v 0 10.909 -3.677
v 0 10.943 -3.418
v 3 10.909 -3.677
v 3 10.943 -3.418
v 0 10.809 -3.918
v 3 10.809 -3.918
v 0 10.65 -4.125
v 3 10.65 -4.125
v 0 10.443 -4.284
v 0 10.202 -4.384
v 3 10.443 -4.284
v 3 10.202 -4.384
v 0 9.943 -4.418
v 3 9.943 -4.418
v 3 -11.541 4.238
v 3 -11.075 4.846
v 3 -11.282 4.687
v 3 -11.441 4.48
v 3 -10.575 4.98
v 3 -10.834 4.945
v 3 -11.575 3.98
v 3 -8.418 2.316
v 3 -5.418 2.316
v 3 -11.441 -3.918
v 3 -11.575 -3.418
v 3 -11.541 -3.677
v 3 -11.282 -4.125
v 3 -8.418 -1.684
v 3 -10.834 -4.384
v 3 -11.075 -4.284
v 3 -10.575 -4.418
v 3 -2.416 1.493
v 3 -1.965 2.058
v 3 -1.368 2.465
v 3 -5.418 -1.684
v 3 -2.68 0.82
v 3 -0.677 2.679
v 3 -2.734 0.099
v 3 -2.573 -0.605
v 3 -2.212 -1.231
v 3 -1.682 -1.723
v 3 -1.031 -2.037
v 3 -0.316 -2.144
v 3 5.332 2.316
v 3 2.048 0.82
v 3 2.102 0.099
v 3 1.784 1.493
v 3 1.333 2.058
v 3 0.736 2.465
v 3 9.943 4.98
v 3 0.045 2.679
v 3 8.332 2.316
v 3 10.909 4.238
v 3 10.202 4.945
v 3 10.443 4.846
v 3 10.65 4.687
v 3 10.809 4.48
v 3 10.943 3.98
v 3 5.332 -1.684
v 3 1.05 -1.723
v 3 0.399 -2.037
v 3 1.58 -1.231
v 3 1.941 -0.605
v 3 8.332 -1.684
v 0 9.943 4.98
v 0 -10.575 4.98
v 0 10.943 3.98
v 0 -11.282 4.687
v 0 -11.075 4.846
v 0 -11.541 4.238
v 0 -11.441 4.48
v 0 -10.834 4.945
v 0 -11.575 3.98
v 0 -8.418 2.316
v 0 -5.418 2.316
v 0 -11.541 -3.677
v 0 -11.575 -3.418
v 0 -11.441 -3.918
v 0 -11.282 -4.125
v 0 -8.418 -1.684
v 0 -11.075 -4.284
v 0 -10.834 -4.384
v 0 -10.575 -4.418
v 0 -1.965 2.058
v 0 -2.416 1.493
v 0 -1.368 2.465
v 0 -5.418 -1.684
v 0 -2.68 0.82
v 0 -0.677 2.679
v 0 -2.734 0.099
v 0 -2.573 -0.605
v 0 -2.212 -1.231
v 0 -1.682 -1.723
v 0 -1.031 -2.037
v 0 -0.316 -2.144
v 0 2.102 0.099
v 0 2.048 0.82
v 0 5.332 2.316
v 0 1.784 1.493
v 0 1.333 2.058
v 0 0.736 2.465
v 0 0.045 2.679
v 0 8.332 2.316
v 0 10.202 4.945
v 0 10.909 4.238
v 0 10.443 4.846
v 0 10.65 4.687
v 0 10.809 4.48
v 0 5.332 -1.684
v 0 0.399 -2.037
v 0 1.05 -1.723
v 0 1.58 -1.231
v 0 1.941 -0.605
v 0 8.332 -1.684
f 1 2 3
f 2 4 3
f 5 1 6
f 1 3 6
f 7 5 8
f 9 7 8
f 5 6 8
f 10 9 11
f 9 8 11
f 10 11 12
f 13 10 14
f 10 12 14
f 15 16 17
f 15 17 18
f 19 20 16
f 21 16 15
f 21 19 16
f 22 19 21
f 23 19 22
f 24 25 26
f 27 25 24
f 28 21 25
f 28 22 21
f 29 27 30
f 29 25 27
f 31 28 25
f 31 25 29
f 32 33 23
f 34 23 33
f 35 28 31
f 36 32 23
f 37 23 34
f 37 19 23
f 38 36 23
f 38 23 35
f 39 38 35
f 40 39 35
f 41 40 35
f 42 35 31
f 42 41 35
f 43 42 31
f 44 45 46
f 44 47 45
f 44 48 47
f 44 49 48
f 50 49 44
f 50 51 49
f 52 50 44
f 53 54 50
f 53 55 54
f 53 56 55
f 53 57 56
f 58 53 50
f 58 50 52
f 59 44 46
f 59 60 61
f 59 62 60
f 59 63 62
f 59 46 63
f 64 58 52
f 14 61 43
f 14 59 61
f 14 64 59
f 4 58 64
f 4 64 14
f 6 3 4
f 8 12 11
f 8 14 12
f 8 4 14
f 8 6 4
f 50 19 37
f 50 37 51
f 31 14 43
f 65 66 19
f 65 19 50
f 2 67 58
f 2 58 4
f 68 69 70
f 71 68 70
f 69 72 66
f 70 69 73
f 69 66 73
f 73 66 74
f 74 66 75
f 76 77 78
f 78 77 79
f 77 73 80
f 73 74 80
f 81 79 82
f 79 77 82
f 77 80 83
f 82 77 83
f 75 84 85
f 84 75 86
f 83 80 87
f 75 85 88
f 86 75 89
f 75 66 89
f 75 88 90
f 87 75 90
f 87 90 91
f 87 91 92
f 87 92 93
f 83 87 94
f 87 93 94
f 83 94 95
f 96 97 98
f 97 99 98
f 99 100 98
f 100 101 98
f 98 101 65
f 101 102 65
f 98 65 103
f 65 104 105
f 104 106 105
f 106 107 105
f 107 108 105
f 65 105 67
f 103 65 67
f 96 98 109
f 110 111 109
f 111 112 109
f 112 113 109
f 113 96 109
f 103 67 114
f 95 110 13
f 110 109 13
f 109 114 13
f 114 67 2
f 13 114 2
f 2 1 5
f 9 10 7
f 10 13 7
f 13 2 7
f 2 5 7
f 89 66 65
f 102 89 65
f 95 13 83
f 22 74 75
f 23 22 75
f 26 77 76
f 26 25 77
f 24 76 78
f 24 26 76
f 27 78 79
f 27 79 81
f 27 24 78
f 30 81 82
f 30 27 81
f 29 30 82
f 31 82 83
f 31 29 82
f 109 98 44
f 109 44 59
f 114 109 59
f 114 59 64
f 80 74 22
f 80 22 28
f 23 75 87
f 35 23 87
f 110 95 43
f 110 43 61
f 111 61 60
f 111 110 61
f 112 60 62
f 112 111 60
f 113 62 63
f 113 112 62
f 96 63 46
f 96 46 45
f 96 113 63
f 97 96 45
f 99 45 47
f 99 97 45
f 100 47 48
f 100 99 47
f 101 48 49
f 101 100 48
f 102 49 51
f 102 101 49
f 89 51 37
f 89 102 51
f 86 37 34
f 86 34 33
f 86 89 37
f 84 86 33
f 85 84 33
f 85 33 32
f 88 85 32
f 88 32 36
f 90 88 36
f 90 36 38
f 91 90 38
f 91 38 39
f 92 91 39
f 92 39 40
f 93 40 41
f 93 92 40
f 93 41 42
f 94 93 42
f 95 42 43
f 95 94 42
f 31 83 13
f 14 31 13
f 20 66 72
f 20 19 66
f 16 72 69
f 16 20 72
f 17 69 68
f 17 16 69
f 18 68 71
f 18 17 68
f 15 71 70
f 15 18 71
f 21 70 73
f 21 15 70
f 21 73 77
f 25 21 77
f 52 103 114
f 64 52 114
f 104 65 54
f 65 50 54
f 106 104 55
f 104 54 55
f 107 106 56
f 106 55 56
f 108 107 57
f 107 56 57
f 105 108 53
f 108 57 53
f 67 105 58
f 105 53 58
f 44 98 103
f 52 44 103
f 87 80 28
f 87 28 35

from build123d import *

# Parameters (mm, degrees)
SKETCH1_W           = 9.397838239
SKETCH1_H           = 22.517705726
SKETCH1_R           = 2.425
SKETCH1_W_2         = 4
SKETCH1_H_2         = 3
BOSS_EXTRUDE1_DEPTH = 3
FILLET1_R           = 1


with BuildPart() as part:
    # Sketch1 → Boss-Extrude1 (new body)
    with BuildSketch(Plane(origin=(0, 0, 0), x_dir=(0, 0, -1), z_dir=(1, 0, 0))):
        with Locations((-0.280633356, -0.315954963)):
            Rectangle(SKETCH1_W, SKETCH1_H)
        with Locations((-0.280633356, -0.315954963)):
            Circle(SKETCH1_R, mode=Mode.SUBTRACT)
        with Locations((-0.315702717, -6.918104791)):
            Rectangle(SKETCH1_W_2, SKETCH1_H_2, mode=Mode.SUBTRACT)
        with Locations((-0.315702717, 6.831895209)):
            Rectangle(SKETCH1_W_2, SKETCH1_H_2, mode=Mode.SUBTRACT)
    extrude(amount=BOSS_EXTRUDE1_DEPTH)

    # Fillet1
    fillet1_edges = [part.edges().sort_by_distance(p)[0] for p in [
        (1.5, 10.9428979, 4.979552475),
        (1.5, 10.9428979, -4.418285764),
        (1.5, -11.574807826, -4.418285764),
        (1.5, -11.574807826, 4.979552475),
    ]]
    fillet(fillet1_edges, radius=FILLET1_R)


solid = part.part
